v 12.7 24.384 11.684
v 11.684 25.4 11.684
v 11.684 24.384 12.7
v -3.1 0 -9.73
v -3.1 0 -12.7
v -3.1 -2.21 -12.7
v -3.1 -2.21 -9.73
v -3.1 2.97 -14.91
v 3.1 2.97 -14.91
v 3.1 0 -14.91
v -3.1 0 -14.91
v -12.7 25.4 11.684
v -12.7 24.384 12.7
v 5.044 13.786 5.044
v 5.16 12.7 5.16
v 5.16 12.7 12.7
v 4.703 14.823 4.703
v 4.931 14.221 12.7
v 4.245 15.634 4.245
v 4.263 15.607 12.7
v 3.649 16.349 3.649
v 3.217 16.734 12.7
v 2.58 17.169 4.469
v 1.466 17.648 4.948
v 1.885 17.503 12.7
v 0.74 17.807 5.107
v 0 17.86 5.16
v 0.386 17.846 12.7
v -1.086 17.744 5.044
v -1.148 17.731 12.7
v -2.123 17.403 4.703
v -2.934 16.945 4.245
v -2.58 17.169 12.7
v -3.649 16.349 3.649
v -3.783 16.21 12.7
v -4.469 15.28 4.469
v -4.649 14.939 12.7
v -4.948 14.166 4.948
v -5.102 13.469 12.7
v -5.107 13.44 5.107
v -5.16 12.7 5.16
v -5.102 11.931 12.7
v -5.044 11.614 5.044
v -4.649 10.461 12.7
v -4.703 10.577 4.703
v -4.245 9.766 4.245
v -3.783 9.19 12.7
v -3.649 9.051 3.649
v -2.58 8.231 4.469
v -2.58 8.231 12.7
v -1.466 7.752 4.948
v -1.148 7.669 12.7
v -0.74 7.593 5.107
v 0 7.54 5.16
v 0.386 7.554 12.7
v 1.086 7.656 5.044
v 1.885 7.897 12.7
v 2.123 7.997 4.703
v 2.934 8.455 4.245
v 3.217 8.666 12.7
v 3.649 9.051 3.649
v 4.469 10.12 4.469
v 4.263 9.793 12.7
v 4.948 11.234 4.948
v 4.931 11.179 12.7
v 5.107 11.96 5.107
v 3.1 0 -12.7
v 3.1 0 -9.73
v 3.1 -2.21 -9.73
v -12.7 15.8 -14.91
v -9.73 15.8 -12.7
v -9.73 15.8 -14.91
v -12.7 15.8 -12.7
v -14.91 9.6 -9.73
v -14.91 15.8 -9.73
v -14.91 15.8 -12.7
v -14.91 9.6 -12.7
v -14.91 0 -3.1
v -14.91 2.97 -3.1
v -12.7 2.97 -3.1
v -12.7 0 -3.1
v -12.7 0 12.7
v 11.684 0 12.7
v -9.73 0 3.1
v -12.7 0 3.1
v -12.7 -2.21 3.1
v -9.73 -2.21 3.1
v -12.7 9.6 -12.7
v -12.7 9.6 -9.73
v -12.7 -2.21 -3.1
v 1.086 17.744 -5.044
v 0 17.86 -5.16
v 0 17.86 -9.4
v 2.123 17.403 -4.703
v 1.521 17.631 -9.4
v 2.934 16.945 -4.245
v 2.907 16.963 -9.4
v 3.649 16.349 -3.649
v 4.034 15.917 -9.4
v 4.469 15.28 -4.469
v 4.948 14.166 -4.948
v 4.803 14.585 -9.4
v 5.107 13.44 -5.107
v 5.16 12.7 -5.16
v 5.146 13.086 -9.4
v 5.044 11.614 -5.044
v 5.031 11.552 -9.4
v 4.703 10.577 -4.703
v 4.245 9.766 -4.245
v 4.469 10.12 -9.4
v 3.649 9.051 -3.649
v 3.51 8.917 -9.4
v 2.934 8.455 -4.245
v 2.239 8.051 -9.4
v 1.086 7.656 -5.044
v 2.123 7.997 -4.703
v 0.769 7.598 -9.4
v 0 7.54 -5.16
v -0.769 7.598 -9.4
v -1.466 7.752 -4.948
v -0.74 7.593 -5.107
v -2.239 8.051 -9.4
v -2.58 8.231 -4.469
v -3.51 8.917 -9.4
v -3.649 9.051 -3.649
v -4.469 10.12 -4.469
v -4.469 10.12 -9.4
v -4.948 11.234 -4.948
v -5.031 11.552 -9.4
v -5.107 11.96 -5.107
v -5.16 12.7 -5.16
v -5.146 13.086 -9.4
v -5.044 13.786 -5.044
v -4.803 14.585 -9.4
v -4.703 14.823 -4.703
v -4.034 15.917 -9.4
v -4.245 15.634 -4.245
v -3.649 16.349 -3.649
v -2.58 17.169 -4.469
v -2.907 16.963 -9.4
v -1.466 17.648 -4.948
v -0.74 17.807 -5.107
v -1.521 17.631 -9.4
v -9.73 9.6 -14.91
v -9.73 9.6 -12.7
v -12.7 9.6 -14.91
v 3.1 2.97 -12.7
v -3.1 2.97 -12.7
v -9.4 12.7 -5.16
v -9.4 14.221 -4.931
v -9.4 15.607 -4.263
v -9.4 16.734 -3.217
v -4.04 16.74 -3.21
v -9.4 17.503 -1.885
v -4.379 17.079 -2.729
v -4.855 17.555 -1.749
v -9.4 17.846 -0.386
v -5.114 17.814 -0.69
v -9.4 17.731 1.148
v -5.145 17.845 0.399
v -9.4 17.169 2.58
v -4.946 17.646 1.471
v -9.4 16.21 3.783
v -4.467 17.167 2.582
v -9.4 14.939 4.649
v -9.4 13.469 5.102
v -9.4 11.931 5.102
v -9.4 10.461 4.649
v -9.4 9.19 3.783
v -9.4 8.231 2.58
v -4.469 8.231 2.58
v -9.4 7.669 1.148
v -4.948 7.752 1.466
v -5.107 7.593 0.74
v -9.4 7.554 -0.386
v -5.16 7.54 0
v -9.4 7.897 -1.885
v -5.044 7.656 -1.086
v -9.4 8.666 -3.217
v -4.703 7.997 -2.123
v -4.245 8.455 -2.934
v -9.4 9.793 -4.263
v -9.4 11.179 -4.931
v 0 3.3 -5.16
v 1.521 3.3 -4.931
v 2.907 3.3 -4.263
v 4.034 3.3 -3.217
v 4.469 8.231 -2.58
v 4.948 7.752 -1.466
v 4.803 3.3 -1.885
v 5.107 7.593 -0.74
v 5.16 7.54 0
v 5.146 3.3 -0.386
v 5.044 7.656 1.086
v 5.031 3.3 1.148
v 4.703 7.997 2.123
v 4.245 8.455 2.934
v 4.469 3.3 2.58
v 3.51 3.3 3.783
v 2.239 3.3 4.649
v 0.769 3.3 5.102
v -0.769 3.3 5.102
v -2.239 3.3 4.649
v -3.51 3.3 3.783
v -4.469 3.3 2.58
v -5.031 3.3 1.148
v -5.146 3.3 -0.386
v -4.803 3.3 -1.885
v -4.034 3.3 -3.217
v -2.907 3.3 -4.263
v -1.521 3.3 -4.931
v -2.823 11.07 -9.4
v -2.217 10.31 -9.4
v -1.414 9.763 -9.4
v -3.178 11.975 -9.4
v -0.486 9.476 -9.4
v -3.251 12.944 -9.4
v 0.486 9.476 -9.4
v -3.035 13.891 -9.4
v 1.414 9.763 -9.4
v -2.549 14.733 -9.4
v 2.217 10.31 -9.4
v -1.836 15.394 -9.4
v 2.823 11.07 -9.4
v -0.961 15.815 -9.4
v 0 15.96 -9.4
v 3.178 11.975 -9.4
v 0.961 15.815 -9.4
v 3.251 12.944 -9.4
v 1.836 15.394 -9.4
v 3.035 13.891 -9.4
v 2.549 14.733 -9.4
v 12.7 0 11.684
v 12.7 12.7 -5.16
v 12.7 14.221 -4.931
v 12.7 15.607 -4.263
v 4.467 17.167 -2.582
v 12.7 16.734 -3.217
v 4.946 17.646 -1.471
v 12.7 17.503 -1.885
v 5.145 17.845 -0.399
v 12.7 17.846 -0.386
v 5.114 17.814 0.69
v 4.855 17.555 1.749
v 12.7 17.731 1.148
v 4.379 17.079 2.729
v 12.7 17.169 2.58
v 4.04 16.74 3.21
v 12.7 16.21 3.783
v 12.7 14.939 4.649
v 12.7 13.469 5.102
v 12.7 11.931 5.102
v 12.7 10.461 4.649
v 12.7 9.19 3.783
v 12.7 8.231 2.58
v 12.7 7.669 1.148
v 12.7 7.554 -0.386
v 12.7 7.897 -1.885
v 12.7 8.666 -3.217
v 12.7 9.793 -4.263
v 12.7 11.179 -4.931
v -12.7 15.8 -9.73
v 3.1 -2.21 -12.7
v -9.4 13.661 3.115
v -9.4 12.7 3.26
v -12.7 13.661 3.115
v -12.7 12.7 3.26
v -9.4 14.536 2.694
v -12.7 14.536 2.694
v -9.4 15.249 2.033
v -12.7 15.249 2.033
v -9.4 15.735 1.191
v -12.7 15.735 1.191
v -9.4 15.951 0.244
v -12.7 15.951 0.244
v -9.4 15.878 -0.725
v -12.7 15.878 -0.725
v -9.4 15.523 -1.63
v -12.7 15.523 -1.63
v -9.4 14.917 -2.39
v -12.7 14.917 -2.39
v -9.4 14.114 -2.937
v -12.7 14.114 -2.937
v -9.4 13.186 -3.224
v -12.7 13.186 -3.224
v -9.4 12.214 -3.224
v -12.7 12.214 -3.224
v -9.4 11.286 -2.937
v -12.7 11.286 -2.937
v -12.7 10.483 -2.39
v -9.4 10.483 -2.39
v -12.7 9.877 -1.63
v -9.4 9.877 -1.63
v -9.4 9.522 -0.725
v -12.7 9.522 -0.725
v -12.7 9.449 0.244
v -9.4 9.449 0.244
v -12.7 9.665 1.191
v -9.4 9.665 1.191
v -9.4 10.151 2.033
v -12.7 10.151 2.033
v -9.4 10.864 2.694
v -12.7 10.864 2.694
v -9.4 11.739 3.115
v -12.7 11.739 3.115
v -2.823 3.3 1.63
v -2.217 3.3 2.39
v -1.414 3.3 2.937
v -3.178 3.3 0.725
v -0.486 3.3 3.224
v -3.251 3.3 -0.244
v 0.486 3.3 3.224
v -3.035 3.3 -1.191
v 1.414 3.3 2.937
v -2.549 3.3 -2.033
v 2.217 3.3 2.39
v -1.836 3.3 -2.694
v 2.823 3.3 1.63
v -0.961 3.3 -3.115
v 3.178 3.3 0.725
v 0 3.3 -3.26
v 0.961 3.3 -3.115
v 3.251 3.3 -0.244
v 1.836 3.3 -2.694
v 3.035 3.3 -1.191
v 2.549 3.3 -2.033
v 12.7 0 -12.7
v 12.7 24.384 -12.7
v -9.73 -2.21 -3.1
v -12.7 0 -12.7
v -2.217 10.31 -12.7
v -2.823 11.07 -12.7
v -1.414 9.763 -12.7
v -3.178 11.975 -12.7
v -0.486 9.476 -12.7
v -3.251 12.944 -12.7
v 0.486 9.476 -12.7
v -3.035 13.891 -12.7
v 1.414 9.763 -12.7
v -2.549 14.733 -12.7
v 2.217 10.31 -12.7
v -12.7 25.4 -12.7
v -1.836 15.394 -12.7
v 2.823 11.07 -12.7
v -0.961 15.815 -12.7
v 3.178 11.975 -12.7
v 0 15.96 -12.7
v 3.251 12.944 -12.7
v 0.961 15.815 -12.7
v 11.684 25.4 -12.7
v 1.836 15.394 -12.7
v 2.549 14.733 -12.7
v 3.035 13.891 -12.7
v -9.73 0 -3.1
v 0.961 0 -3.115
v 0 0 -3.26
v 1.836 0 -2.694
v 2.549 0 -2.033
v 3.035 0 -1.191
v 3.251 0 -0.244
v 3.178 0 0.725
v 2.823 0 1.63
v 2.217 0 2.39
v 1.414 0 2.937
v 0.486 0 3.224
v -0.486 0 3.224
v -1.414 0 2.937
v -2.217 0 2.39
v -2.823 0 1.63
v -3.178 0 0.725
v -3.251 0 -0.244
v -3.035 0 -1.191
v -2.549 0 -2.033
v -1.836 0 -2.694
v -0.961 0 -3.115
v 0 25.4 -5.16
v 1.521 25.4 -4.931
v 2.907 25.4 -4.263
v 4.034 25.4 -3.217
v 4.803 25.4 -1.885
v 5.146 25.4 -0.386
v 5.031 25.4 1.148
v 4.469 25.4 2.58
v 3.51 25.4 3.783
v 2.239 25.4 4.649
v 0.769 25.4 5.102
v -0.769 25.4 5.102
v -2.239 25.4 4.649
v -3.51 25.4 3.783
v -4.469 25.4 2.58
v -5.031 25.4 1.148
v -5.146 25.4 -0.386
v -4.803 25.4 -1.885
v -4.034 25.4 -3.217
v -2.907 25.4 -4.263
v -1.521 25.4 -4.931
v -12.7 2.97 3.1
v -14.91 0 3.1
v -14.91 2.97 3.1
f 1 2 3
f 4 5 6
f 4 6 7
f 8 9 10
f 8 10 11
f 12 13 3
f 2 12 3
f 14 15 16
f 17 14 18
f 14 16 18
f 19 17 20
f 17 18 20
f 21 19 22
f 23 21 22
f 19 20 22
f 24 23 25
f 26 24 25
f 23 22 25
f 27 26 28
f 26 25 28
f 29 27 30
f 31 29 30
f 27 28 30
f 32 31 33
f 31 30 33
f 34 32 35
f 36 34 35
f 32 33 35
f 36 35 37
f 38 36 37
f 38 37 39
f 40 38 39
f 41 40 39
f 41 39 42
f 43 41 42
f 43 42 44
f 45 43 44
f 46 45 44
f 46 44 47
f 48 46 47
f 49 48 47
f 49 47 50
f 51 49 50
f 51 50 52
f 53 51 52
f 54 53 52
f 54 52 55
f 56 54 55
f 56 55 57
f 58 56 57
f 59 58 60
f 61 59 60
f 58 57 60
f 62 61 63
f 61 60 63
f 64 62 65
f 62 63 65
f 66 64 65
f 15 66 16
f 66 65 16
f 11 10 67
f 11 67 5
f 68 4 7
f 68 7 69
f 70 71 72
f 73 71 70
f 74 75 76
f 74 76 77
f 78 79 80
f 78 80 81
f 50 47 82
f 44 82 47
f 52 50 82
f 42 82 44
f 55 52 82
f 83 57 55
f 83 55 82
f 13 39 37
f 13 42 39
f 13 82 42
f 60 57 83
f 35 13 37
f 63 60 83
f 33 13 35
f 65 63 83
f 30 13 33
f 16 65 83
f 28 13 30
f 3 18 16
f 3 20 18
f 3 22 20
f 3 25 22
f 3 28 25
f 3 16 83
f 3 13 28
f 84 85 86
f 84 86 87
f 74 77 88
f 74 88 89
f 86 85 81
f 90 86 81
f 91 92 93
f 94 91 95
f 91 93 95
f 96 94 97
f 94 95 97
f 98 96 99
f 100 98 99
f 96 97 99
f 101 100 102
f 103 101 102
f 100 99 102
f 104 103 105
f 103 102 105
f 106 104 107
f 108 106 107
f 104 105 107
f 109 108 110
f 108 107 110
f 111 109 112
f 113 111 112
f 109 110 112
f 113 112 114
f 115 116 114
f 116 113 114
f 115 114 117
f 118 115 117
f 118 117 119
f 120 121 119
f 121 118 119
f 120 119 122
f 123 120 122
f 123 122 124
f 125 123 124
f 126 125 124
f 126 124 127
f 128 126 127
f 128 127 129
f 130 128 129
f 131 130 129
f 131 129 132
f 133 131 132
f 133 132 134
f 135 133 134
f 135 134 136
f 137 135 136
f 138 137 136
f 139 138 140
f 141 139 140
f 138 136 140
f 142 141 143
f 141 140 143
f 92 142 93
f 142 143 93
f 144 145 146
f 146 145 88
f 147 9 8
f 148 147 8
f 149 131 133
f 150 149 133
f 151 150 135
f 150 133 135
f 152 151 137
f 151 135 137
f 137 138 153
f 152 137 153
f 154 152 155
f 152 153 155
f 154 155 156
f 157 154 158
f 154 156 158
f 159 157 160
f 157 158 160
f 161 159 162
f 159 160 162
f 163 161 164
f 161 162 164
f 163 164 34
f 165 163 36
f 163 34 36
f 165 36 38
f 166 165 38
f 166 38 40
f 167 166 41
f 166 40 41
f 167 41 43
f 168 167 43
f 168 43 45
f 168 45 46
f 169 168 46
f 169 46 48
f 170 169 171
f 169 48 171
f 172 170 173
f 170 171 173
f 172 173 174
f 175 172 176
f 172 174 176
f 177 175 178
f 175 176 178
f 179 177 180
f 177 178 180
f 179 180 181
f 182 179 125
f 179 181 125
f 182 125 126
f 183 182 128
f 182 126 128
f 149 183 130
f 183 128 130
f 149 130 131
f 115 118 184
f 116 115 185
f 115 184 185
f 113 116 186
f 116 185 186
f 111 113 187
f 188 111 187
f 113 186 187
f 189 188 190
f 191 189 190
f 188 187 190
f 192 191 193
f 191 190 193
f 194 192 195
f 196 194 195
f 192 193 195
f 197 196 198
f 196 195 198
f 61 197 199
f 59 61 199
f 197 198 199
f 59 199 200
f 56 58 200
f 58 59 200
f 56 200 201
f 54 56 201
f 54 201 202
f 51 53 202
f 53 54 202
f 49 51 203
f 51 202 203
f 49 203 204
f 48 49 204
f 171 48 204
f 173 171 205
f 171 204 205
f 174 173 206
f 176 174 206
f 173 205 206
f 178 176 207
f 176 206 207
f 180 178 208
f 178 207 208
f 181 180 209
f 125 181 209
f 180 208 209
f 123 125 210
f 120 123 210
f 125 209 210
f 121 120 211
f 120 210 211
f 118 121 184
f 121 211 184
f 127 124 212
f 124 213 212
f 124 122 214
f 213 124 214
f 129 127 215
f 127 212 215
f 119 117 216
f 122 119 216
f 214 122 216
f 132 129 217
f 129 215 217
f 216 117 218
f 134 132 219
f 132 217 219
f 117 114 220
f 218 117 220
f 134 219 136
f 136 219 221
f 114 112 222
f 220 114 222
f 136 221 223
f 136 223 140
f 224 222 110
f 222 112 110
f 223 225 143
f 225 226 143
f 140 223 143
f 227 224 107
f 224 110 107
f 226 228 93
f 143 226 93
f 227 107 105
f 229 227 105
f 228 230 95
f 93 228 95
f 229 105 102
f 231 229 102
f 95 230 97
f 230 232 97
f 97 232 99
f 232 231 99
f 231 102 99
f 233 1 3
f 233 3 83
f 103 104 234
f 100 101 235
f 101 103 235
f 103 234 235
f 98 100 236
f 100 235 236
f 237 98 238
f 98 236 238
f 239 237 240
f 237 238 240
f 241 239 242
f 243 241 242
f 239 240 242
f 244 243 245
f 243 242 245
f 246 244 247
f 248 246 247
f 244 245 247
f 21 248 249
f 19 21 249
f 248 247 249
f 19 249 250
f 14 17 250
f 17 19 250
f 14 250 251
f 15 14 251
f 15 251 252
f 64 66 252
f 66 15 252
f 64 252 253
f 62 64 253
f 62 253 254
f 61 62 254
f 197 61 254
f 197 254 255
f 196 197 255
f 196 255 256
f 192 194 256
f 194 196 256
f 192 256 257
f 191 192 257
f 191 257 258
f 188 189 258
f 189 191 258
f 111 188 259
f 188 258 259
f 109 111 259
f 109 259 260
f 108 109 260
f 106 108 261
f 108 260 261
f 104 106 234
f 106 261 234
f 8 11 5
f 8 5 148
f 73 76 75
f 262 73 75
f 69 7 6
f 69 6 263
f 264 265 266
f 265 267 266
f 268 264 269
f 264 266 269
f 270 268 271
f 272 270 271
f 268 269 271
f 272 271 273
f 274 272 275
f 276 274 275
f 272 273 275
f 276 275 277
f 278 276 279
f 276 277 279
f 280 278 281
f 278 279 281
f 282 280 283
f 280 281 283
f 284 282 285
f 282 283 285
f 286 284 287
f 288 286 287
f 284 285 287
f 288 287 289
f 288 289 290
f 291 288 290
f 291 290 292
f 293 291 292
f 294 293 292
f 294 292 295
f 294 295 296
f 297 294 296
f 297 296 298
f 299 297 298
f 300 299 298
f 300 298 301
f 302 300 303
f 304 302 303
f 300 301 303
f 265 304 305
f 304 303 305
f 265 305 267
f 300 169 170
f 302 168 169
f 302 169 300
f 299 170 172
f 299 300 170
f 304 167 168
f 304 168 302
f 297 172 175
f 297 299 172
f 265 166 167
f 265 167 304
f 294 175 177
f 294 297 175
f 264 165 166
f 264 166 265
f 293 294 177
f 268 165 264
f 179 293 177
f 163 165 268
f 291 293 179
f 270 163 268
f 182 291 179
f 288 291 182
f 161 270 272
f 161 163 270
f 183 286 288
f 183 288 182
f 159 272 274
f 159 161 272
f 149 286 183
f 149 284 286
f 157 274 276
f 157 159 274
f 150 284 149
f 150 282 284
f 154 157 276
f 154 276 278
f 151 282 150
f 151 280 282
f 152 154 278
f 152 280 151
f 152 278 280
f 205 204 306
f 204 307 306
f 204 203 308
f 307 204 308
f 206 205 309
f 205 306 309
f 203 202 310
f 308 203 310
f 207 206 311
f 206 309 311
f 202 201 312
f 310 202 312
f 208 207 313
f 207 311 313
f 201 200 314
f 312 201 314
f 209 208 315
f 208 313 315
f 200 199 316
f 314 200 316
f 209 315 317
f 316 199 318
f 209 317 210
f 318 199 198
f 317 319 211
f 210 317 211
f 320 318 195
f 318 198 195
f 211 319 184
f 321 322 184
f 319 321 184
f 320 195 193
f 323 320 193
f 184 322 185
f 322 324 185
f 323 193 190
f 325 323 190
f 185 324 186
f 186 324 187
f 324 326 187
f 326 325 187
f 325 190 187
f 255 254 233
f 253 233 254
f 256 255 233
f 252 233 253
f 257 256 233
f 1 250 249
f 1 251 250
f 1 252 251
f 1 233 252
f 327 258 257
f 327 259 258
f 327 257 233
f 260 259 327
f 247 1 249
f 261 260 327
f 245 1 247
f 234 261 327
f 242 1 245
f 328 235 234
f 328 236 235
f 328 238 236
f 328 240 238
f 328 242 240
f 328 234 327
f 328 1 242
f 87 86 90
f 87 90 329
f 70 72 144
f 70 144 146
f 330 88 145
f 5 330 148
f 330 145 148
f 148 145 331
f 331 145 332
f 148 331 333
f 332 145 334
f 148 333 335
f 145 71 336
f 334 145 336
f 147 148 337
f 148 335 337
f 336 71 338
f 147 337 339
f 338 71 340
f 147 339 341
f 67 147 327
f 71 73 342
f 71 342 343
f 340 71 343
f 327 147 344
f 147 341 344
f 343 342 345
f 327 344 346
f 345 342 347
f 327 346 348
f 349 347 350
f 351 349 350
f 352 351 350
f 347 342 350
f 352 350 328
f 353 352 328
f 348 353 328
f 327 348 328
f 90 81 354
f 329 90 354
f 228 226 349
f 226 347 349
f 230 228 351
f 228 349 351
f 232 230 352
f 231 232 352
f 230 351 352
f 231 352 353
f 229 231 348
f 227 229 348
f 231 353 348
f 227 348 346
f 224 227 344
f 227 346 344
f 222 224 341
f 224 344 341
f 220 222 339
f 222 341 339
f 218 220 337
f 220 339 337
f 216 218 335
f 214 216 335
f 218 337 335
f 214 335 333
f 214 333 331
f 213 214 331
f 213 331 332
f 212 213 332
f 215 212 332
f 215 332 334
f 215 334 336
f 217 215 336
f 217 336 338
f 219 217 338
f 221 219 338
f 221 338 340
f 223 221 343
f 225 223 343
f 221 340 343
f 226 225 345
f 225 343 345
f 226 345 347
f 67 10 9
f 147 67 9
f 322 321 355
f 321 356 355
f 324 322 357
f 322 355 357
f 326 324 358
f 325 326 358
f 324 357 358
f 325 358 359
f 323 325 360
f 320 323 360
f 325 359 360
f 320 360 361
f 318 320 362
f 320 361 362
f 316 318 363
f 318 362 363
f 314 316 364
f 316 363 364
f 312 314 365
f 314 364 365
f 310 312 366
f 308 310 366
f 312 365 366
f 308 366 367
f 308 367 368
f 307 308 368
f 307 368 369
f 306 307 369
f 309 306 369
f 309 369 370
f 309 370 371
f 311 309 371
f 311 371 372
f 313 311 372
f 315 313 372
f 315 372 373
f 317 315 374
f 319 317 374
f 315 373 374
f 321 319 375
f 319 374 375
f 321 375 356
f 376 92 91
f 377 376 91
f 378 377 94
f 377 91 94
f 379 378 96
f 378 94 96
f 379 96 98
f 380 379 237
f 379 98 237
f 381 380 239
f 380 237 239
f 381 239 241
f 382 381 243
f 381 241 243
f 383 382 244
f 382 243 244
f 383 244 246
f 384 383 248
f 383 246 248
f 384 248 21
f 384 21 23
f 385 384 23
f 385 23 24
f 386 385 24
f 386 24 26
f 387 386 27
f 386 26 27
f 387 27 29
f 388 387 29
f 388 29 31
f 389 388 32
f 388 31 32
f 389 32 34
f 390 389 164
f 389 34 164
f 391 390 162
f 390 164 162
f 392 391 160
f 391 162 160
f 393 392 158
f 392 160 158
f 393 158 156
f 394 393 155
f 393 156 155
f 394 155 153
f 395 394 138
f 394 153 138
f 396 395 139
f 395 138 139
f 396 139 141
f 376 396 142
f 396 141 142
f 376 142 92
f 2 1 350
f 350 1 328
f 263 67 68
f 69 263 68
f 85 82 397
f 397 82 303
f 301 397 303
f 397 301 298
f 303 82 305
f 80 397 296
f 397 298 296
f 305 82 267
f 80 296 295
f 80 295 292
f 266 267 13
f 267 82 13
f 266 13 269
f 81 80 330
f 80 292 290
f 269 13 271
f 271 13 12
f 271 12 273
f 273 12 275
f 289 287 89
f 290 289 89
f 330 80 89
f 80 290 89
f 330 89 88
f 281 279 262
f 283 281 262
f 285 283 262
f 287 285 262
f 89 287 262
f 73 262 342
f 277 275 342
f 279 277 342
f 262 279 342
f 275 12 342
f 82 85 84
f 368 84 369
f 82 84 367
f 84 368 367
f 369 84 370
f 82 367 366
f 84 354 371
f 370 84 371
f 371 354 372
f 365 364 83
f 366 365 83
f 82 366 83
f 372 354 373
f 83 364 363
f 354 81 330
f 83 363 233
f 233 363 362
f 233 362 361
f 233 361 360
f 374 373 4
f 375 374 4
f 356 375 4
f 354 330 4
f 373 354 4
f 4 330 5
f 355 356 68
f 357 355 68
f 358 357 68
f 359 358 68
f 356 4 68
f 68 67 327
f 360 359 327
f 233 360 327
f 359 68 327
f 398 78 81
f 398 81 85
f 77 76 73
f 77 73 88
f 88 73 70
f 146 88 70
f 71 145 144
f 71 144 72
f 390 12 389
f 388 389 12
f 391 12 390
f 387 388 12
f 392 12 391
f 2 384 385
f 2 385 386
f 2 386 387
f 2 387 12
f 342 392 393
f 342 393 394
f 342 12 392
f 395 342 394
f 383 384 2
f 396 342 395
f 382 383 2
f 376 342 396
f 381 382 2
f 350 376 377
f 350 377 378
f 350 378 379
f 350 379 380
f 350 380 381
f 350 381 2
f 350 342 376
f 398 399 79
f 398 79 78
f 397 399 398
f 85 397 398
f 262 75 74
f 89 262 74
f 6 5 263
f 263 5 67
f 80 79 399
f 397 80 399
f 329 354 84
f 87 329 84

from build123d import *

# Parameters (mm, degrees)
SKETCH1_W           = 25.4
SKETCH1_H           = 25.4
BOSS_EXTRUDE1_DEPTH = 25.4
SKETCH6_W           = 2.96999914
SKETCH6_H           = 6.19999776
BOSS_EXTRUDE2_DEPTH = 2.20999812
BOSS_EXTRUDE3_REACH = 42.371
SKETCH7_W           = 6.19999776
SKETCH7_H           = 2.96999914
SKETCH8_W           = 6.19999776
SKETCH8_H           = 2.96999914
BOSS_EXTRUDE4_DEPTH = 2.20999812
BOSS_EXTRUDE5_REACH = 42.371
SKETCH9_W           = 6.19999776
SKETCH9_H           = 2.96999914
SKETCH10_W          = 2.96999914
SKETCH10_H          = 6.19999776
BOSS_EXTRUDE6_DEPTH = 2.20999812
BOSS_EXTRUDE7_REACH = 42.371
SKETCH11_W          = 2.96999914
SKETCH11_H          = 6.19999776
HOLE3_REACH         = 42.371
HOLE3_BORE_R        = 5.15999984
HOLE4_D             = 6.51999712
HOLE4_CBORE_D       = 10.31999968
HOLE4_CBORE_DEPTH   = 22.09999898
CHAMFER1_SIZE       = 1.016


with BuildPart() as part:
    # Sketch1 → Boss-Extrude1 (new body)
    with BuildSketch(Plane(origin=(0, 25.4, 0), x_dir=(1, 0, 0), z_dir=(0, 1, 0))):
        Rectangle(SKETCH1_W, SKETCH1_H)
    extrude(amount=-BOSS_EXTRUDE1_DEPTH)

    # Sketch2 → Hole1 (revolve, cut)
    with BuildSketch(Plane(origin=(0, 0, 0), x_dir=(0, 0, -1), z_dir=(1, 0, 0))):
        Polygon((0, 0), (0, 25.4), (5.15999984, 25.4), (5.15999984, 3.30000102), (3.25999856, 3.30000102), (3.25999856, 0), align=None)
    revolve(axis=Axis((0, 110, 0), (0, -1, 0)), mode=Mode.SUBTRACT)

    # Sketch4 → Hole2 (revolve, cut)
    with BuildSketch(Plane(origin=(0, 12.7, -12.7), x_dir=(0, 1, 0), z_dir=(1, 0, 0))):
        Polygon((0, 0), (0, 12.7), (5.15999984, 12.7), (5.15999984, 3.30000102), (3.25999856, 3.30000102), (3.25999856, 0), align=None)
    revolve(axis=Axis((0, 12.7, 97.3), (0, 0, -1)), mode=Mode.SUBTRACT)

    # Sketch6 → Boss-Extrude2 (add)
    with BuildSketch(Plane(origin=(0, 0, -12.7), x_dir=(-1, 0, 0), z_dir=(0, 0, -1))):
        with Locations((11.21500043, 12.7)):
            Rectangle(SKETCH6_W, SKETCH6_H)
    extrude(amount=BOSS_EXTRUDE2_DEPTH)

    # Sketch7 → Boss-Extrude3 (add, up to next)
    with BuildSketch(Plane(origin=(-14.90999812, 0, 0), x_dir=(0, -1, 0), z_dir=(-1, 0, 0)), mode=Mode.PRIVATE) as boss_extrude3_sk1:
        with Locations((-12.7, -11.21500043)):
            Rectangle(SKETCH7_W, SKETCH7_H)
    boss_extrude3_tool1 = extrude(boss_extrude3_sk1.sketch, amount=-BOSS_EXTRUDE3_REACH, mode=Mode.PRIVATE) - part.part
    add(boss_extrude3_tool1.solids().sort_by_distance((-14.909998, 12.7, -11.215))[0])

    # Sketch8 → Boss-Extrude4 (add)
    with BuildSketch(Plane.XZ):
        with Locations((0, -11.21500043)):
            Rectangle(SKETCH8_W, SKETCH8_H)
    extrude(amount=BOSS_EXTRUDE4_DEPTH)

    # Sketch9 → Boss-Extrude5 (add, up to next)
    with BuildSketch(Plane(origin=(0, 0, -14.90999812), x_dir=(-1, 0, 0), z_dir=(0, 0, -1)), mode=Mode.PRIVATE) as boss_extrude5_sk1:
        with Locations((0, 1.48499957)):
            Rectangle(SKETCH9_W, SKETCH9_H)
    boss_extrude5_tool1 = extrude(boss_extrude5_sk1.sketch, amount=-BOSS_EXTRUDE5_REACH, mode=Mode.PRIVATE) - part.part
    add(boss_extrude5_tool1.solids().sort_by_distance((0, 1.485, -14.909998))[0])

    # Sketch10 → Boss-Extrude6 (add)
    with BuildSketch(Plane.XZ):
        with Locations((-11.21500043, 0)):
            Rectangle(SKETCH10_W, SKETCH10_H)
    extrude(amount=BOSS_EXTRUDE6_DEPTH)

    # Sketch11 → Boss-Extrude7 (add, up to next)
    with BuildSketch(Plane(origin=(-14.90999812, 0, 0), x_dir=(0, -1, 0), z_dir=(-1, 0, 0)), mode=Mode.PRIVATE) as boss_extrude7_sk1:
        with Locations((-1.48499957, 0)):
            Rectangle(SKETCH11_W, SKETCH11_H)
    boss_extrude7_tool1 = extrude(boss_extrude7_sk1.sketch, amount=-BOSS_EXTRUDE7_REACH, mode=Mode.PRIVATE) - part.part
    add(boss_extrude7_tool1.solids().sort_by_distance((-14.909998, 1.485, 0))[0])

    # Hole3 bore → Hole3 (cut, up to next)
    with BuildSketch(Plane.XY.offset(12.7), mode=Mode.PRIVATE) as hole3_sk1:
        with Locations((0, 12.7)):
            Circle(HOLE3_BORE_R)
    hole3_tool1 = extrude(hole3_sk1.sketch, amount=-HOLE3_REACH, mode=Mode.PRIVATE) & part.part
    add(hole3_tool1.solids().sort_by_distance((0, 12.7, 12.7))[0], mode=Mode.SUBTRACT)

    # Hole4 (through all)
    with Locations(Plane(origin=(12.7, 0, 0), x_dir=(0, 0, -1), z_dir=(1, 0, 0))):
        with Locations((0, 12.7)):
            CounterBoreHole(HOLE4_D / 2, HOLE4_CBORE_D / 2, HOLE4_CBORE_DEPTH)

    # Chamfer1
    chamfer1_edges = [part.edges().sort_by_distance(p)[0] for p in [
        (12.7, 25.4, 0),
        (0, 25.4, 12.7),
        (12.7, 12.7, 12.7),
    ]]
    chamfer(chamfer1_edges, length=CHAMFER1_SIZE)


solid = part.part
